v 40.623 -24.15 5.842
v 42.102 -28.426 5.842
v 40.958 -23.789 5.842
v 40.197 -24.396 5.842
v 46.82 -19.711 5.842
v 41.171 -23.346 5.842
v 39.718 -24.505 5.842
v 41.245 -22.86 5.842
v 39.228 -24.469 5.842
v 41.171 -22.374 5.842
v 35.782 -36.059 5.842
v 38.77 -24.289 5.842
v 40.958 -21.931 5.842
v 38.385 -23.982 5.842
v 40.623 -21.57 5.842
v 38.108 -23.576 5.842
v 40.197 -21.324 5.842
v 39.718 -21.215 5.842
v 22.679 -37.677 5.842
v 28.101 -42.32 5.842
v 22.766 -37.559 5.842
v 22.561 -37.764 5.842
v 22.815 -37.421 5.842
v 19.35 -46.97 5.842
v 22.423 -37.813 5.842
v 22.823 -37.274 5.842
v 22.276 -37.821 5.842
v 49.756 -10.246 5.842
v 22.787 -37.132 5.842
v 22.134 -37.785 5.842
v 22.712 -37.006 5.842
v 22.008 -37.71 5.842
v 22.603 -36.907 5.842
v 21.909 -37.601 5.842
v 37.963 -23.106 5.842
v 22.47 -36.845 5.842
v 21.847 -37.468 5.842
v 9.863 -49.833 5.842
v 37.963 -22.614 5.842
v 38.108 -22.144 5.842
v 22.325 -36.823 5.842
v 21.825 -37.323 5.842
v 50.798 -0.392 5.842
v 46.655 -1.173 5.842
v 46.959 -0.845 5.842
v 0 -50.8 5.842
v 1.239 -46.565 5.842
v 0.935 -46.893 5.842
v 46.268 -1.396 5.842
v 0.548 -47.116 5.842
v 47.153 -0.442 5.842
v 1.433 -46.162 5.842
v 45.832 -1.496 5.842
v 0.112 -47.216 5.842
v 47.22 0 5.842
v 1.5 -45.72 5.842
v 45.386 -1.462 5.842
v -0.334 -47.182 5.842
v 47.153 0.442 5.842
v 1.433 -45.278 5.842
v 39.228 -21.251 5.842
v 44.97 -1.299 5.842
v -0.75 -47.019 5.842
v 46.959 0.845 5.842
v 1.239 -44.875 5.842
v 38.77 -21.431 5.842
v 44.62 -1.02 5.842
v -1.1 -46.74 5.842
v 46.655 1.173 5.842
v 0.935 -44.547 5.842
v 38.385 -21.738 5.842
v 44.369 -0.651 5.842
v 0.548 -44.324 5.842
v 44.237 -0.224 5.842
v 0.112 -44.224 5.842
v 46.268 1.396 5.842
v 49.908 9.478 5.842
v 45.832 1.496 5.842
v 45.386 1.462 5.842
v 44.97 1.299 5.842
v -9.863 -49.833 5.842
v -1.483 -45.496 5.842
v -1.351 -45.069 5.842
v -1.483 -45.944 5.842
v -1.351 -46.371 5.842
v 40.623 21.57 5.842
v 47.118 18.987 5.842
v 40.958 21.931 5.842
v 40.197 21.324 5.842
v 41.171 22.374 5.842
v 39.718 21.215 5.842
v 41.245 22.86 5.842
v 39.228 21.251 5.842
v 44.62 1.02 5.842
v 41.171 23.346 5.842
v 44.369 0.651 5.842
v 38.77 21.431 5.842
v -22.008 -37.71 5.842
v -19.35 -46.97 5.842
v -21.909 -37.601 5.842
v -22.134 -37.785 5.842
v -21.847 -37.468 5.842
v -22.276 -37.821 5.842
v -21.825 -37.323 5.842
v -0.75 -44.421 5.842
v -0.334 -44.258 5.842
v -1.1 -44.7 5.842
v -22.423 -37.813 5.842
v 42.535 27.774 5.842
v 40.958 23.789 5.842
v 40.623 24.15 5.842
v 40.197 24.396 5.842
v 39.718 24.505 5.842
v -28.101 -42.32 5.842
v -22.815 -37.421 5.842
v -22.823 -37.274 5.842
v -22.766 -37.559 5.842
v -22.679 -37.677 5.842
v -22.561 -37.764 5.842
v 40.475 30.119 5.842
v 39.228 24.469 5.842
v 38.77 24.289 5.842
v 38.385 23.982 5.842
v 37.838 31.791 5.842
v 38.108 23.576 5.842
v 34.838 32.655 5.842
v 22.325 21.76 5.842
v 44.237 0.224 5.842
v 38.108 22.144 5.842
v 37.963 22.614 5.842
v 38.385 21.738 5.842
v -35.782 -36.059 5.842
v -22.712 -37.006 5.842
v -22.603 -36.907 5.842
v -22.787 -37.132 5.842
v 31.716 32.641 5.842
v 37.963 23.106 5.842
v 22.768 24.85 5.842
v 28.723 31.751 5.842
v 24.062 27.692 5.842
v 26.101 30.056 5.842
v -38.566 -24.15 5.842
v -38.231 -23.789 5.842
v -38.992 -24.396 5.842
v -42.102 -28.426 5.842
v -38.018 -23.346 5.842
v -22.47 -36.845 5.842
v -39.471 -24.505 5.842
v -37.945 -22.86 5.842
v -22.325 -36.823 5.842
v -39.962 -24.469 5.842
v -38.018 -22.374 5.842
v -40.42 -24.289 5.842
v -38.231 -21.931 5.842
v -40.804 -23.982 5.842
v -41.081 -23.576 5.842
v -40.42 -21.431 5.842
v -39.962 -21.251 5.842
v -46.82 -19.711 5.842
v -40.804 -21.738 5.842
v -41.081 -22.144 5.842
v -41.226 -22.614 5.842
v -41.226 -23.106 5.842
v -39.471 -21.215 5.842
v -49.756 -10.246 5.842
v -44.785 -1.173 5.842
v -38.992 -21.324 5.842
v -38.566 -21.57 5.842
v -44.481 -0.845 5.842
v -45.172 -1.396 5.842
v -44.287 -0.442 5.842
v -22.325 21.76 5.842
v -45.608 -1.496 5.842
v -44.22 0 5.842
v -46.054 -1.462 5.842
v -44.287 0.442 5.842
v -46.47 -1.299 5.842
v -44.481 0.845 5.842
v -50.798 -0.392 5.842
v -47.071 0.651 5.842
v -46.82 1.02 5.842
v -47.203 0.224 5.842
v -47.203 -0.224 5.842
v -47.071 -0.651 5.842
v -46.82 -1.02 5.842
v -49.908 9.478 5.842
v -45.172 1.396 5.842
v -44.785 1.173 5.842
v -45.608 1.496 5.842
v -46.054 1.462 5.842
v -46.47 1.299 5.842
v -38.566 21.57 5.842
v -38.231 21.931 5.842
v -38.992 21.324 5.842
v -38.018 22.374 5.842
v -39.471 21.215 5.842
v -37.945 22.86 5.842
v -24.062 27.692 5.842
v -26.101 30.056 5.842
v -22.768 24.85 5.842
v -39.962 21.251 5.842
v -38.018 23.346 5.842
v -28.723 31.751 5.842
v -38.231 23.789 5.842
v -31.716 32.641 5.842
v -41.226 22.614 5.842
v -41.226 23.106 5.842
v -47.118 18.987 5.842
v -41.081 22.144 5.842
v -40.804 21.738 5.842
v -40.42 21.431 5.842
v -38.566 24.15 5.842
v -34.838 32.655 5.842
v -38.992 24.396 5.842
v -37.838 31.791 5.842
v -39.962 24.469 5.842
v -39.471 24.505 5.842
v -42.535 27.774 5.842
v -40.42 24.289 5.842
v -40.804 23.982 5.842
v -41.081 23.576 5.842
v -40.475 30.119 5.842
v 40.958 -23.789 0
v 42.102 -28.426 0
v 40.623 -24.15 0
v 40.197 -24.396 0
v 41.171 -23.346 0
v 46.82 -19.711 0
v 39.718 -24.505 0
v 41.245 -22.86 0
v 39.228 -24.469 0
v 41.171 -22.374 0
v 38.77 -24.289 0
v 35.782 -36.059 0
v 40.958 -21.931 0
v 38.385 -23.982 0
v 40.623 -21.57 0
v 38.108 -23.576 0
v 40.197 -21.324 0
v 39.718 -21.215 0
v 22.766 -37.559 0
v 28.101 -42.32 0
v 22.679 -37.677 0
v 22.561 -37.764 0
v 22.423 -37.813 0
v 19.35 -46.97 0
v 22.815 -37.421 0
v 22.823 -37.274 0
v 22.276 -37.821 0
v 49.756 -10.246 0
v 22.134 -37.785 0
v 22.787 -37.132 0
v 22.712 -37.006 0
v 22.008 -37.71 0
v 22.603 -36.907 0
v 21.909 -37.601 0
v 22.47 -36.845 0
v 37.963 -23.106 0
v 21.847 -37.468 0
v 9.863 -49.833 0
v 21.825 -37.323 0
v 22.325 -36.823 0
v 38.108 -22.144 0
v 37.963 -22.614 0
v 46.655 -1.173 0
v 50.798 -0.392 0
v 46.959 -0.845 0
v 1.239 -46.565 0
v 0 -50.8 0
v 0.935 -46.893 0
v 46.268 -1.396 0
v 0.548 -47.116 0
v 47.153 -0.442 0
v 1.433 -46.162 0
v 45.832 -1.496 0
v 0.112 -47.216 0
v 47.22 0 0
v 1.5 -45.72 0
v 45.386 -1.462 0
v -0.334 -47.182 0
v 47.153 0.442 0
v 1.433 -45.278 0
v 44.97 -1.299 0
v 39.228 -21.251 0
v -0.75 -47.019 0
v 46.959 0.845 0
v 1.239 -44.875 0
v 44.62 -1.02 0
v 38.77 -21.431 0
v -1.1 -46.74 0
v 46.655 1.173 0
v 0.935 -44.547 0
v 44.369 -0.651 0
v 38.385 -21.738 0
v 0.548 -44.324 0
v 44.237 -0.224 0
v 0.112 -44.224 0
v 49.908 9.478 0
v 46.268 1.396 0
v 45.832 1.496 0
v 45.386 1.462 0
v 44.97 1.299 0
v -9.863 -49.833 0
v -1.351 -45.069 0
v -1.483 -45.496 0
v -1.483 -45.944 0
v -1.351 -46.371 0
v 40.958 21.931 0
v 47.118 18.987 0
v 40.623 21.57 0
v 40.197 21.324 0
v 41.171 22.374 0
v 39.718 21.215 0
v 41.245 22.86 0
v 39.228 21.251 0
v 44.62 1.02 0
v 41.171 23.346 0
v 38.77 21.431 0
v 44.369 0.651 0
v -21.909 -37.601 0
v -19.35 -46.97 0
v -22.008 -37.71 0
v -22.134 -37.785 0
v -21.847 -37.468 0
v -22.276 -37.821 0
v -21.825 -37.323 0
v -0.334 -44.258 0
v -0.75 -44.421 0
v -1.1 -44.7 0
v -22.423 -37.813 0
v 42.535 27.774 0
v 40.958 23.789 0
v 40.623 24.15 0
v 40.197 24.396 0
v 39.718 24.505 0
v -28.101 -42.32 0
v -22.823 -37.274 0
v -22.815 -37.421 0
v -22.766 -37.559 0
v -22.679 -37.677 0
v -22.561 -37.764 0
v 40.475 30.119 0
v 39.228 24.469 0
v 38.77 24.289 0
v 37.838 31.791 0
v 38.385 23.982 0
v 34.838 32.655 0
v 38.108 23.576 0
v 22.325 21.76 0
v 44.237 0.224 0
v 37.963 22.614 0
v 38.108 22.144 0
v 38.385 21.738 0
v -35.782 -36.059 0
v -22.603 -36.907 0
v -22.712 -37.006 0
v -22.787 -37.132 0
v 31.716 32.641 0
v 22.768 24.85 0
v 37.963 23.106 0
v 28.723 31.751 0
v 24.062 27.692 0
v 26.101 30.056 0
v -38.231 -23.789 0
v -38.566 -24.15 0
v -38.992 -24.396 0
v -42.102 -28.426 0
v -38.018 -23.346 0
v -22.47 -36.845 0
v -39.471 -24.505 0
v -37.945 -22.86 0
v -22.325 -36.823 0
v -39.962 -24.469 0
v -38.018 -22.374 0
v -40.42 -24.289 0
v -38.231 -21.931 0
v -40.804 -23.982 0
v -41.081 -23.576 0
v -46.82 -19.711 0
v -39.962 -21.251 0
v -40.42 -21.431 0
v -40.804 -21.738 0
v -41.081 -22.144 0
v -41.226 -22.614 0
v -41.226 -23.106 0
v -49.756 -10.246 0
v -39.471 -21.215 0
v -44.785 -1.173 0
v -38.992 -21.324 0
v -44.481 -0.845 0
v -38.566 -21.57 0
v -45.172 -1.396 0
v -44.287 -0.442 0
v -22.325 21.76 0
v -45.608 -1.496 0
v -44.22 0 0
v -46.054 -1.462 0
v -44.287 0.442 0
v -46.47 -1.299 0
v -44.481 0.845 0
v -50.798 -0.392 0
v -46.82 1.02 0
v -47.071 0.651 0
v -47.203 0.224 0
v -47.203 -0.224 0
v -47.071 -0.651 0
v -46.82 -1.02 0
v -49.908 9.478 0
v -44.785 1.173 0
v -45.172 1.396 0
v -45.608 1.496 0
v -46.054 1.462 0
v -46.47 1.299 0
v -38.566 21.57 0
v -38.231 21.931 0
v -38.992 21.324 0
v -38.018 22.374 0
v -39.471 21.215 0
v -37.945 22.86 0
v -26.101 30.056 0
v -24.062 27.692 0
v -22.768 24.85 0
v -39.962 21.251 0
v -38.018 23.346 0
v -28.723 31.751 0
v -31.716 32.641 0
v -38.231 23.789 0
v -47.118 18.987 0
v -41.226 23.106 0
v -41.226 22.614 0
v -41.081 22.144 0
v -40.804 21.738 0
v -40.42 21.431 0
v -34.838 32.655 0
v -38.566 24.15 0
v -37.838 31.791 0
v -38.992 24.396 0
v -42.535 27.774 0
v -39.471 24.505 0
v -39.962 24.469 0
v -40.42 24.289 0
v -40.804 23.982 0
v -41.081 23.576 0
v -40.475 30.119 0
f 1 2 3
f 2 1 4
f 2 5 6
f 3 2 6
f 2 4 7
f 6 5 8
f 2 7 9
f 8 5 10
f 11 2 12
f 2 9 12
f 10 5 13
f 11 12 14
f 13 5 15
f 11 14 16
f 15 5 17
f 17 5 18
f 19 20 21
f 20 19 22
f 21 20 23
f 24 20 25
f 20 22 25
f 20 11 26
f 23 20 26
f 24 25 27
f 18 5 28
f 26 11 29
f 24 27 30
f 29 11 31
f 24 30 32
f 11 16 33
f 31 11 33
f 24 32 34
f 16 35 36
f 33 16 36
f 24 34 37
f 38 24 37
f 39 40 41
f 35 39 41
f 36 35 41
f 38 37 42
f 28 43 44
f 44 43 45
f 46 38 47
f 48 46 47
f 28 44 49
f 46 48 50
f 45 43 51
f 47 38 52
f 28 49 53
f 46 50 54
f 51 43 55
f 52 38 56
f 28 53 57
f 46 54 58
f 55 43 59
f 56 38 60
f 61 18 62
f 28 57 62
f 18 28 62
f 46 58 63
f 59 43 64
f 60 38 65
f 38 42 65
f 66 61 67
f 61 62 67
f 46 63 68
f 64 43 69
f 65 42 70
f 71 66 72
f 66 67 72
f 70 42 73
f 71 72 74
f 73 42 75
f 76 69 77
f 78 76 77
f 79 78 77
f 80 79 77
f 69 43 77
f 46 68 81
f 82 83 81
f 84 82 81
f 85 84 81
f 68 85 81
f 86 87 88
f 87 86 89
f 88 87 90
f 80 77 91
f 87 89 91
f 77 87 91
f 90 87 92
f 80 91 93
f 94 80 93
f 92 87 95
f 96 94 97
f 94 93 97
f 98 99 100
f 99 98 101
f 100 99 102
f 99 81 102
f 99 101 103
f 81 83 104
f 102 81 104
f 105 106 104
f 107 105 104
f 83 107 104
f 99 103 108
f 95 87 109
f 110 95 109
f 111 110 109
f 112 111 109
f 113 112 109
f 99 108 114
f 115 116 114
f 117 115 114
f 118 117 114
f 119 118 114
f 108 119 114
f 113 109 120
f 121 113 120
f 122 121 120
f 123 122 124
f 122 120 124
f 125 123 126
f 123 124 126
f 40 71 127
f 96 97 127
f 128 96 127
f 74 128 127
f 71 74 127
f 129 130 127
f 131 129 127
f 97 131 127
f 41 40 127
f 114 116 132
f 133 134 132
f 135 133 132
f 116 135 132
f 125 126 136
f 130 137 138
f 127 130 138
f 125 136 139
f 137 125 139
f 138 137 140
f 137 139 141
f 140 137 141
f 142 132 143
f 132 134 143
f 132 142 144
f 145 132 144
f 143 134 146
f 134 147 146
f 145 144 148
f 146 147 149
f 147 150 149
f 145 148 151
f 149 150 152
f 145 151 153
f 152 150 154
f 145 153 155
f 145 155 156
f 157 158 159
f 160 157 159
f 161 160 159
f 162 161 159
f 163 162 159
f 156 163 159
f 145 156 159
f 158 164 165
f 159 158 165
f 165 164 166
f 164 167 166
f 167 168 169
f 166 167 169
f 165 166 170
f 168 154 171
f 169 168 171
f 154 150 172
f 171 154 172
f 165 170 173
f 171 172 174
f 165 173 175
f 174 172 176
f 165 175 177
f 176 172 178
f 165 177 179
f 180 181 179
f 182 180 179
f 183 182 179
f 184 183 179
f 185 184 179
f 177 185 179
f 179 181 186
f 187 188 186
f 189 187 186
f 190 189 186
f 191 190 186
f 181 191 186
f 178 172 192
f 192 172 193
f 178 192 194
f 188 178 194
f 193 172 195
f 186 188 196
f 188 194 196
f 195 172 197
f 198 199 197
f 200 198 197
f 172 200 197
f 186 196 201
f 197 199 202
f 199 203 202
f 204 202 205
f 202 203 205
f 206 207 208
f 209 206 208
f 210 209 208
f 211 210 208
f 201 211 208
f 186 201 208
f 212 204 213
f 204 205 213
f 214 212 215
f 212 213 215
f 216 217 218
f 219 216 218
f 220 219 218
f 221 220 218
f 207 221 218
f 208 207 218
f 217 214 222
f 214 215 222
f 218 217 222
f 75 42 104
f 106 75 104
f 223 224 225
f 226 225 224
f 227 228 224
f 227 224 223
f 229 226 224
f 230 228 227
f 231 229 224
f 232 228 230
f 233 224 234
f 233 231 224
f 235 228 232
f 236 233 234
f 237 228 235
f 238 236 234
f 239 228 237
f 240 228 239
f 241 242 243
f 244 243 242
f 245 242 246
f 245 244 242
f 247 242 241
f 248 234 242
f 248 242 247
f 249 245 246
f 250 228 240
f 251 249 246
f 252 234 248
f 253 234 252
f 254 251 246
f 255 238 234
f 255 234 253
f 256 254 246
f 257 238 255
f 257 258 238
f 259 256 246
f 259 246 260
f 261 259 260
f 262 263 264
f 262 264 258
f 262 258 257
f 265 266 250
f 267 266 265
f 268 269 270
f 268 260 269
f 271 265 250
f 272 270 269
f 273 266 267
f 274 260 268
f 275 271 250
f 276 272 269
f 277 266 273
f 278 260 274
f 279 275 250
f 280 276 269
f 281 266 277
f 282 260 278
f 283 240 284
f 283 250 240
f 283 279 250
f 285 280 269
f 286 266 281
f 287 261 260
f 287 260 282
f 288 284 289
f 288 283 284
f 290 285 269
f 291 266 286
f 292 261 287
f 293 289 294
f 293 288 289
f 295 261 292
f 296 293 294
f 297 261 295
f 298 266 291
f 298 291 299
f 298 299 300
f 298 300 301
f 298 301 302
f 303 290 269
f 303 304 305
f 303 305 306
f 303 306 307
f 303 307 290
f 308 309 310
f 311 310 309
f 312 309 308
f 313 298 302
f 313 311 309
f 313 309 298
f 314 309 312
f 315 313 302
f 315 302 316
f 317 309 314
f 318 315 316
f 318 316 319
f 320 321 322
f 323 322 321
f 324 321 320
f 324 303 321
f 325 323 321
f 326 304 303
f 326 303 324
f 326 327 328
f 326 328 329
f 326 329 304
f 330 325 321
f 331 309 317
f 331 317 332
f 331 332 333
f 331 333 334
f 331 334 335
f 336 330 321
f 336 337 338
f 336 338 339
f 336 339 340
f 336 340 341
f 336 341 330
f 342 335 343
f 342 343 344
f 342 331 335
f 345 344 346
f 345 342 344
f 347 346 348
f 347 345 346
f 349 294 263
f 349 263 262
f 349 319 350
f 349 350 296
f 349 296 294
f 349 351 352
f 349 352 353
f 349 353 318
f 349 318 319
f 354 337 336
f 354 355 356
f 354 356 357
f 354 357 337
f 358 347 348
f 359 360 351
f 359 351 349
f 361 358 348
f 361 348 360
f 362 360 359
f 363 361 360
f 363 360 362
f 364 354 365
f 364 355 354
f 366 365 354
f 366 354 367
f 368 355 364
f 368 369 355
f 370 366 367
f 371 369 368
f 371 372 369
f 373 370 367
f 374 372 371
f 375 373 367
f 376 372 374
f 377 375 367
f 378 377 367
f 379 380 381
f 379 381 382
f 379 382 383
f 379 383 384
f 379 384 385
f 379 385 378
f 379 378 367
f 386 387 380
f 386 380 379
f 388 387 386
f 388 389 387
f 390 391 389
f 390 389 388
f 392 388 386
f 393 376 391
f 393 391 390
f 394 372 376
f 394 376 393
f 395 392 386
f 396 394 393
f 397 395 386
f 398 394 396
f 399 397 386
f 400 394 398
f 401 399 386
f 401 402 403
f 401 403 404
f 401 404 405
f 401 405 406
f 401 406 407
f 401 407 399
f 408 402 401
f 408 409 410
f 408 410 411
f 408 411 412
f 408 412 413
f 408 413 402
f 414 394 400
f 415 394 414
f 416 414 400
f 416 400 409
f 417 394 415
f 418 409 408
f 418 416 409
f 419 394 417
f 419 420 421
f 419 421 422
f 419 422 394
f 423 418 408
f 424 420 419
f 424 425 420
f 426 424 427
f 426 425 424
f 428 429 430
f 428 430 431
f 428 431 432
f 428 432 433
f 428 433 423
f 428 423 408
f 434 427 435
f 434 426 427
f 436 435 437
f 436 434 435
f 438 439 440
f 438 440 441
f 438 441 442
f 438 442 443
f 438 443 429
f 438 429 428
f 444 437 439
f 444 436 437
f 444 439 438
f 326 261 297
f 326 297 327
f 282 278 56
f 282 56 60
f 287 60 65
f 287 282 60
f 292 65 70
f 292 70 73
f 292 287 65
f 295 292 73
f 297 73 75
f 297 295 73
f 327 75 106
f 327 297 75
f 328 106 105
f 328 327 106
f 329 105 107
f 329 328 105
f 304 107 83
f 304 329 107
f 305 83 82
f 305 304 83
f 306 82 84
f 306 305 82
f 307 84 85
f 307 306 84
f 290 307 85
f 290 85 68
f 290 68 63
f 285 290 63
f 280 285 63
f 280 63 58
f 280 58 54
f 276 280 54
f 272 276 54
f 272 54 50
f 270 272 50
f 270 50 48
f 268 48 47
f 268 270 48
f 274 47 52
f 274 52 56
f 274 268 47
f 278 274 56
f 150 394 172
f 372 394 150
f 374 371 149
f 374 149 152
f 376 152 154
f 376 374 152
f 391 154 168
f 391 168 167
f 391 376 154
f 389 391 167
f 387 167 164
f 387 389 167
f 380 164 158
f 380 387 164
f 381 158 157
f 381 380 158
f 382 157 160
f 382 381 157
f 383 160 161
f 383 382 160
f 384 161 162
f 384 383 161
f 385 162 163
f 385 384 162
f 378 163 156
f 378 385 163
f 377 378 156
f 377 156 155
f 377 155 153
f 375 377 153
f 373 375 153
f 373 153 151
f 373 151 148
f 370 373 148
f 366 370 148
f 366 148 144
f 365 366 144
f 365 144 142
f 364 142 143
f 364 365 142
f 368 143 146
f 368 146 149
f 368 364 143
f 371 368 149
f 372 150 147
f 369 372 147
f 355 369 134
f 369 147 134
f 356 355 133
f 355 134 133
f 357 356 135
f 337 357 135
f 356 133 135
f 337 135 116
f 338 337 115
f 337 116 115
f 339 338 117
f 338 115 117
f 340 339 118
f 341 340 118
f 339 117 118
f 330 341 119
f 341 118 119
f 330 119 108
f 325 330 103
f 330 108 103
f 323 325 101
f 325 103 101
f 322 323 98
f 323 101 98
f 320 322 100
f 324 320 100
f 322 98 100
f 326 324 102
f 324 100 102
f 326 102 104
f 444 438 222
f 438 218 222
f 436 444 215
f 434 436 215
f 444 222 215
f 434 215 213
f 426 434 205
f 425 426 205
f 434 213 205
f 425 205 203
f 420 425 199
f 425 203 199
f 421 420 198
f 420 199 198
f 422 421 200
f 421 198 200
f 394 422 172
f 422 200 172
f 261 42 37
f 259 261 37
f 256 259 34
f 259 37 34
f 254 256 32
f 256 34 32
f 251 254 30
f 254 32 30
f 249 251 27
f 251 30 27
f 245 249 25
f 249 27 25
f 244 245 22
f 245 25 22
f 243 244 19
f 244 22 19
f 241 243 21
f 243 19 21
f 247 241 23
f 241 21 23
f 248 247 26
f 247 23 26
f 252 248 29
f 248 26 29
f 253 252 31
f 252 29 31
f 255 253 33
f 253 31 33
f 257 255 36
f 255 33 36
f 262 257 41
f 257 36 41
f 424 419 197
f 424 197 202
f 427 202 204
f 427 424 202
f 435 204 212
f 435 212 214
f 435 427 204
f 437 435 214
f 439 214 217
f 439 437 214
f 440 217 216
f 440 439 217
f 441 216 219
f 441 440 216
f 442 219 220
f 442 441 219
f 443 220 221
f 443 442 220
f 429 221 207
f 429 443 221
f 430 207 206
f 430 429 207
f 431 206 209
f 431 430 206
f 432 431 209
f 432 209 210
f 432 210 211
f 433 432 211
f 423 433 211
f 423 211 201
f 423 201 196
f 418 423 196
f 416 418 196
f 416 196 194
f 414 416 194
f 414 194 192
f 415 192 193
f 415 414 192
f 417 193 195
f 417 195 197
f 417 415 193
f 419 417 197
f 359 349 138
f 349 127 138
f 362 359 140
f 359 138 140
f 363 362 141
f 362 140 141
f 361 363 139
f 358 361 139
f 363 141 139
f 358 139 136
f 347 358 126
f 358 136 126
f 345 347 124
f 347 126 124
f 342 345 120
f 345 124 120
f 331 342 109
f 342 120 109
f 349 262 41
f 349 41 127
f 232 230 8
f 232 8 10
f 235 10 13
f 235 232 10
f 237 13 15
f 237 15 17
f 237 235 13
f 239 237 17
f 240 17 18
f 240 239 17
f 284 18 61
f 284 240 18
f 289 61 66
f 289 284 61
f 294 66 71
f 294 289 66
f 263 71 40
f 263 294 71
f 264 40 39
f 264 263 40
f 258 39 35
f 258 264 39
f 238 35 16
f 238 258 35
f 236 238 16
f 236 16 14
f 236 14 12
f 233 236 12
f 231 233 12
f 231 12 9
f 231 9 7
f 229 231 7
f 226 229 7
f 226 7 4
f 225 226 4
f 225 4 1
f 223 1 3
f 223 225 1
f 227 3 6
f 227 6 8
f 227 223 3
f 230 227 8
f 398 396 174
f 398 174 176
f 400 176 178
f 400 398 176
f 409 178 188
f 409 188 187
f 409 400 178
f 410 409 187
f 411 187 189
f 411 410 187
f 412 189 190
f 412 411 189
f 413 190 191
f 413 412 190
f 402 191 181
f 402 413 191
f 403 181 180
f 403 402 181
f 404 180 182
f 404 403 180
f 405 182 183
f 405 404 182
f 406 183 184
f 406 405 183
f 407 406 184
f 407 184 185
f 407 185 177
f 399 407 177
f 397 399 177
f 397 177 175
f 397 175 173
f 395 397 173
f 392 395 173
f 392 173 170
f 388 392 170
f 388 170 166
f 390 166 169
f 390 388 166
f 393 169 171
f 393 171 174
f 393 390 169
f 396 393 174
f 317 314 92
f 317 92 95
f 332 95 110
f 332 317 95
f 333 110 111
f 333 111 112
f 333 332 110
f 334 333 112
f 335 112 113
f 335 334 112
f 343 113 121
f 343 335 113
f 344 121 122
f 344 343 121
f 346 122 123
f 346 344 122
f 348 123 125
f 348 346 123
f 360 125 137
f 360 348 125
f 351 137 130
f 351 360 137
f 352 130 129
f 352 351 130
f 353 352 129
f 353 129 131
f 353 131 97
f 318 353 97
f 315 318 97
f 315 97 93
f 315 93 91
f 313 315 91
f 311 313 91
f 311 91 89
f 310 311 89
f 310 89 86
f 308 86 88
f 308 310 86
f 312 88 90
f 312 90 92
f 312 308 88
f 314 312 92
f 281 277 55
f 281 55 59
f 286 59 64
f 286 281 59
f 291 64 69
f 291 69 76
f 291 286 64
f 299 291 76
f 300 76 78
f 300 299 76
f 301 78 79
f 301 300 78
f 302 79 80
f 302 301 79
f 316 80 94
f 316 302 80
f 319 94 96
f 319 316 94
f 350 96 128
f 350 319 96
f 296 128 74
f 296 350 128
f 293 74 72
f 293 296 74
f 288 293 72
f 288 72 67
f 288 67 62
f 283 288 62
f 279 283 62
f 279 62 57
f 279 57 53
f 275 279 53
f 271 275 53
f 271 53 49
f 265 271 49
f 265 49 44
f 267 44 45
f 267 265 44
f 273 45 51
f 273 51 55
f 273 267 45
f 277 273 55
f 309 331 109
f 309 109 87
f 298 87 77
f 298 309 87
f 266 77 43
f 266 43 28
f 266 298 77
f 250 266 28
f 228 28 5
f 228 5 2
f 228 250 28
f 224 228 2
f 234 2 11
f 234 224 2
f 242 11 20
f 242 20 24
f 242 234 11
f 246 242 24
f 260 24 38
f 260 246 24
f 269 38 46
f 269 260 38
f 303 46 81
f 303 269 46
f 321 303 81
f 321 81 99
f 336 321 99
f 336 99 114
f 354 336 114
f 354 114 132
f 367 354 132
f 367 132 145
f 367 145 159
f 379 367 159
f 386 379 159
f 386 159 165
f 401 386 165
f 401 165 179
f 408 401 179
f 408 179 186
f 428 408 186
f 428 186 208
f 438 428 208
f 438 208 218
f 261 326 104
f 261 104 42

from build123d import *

# Parameters (mm, degrees)
SKETCH1_R           = 1.5
SKETCH1_R_2         = 1.65
BOSS_EXTRUDE1_DEPTH = 5.842
FILLET2_R           = 11
SKETCH2_R           = 0.5
CUT_EXTRUDE1_DEPTH  = 73.079185373


with BuildPart() as part:
    # Sketch1 → Boss-Extrude1 (new body)
    with BuildSketch(Plane.XY):
        with BuildLine():
            Line((22.325000054, -37.323), (22.325000054, 28.495993037))
            Line((22.325000054, 28.495993037), (22.325000054, 45.631506359))
            ThreePointArc((22.325000054, 45.631506359), (0, -50.8), (-22.325000054, 45.631506359))
            Line((-22.325000054, 45.631506359), (-22.325000054, 28.495993037))
            Line((-22.325000054, 28.495993037), (-22.325000054, -37.323))
            Line((-22.325000054, -37.323), (22.325000054, -37.323))
        make_face()
        with Locations((-45.72, 0)):
            Circle(SKETCH1_R, mode=Mode.SUBTRACT)
        with Locations((45.72, 0)):
            Circle(SKETCH1_R, mode=Mode.SUBTRACT)
        with Locations((0, -45.72)):
            Circle(SKETCH1_R, mode=Mode.SUBTRACT)
        with Locations((39.594681461, 22.86)):
            Circle(SKETCH1_R_2, mode=Mode.SUBTRACT)
        with Locations((39.594681461, -22.86)):
            Circle(SKETCH1_R_2, mode=Mode.SUBTRACT)
        with Locations((-39.594681461, -22.86)):
            Circle(SKETCH1_R_2, mode=Mode.SUBTRACT)
        with Locations((-39.594681461, 22.86)):
            Circle(SKETCH1_R_2, mode=Mode.SUBTRACT)
    extrude(amount=BOSS_EXTRUDE1_DEPTH)

    # Fillet2
    fillet2_edges = [part.edges().sort_by_distance(p)[0] for p in [
        (22.325000054, 45.631506359, 2.921),
        (-22.325000054, 45.631506359, 2.921),
    ]]
    fillet(fillet2_edges, radius=FILLET2_R)

    # Sketch2 → Cut-Extrude1 (cut, through all)
    with BuildSketch(Plane.XY.offset(5.842)):
        with Locations((-22.325000054, -37.323)):
            Circle(SKETCH2_R)
        with Locations((22.325000054, -37.323)):
            Circle(SKETCH2_R)
    extrude(amount=-CUT_EXTRUDE1_DEPTH, mode=Mode.SUBTRACT)


solid = part.part
